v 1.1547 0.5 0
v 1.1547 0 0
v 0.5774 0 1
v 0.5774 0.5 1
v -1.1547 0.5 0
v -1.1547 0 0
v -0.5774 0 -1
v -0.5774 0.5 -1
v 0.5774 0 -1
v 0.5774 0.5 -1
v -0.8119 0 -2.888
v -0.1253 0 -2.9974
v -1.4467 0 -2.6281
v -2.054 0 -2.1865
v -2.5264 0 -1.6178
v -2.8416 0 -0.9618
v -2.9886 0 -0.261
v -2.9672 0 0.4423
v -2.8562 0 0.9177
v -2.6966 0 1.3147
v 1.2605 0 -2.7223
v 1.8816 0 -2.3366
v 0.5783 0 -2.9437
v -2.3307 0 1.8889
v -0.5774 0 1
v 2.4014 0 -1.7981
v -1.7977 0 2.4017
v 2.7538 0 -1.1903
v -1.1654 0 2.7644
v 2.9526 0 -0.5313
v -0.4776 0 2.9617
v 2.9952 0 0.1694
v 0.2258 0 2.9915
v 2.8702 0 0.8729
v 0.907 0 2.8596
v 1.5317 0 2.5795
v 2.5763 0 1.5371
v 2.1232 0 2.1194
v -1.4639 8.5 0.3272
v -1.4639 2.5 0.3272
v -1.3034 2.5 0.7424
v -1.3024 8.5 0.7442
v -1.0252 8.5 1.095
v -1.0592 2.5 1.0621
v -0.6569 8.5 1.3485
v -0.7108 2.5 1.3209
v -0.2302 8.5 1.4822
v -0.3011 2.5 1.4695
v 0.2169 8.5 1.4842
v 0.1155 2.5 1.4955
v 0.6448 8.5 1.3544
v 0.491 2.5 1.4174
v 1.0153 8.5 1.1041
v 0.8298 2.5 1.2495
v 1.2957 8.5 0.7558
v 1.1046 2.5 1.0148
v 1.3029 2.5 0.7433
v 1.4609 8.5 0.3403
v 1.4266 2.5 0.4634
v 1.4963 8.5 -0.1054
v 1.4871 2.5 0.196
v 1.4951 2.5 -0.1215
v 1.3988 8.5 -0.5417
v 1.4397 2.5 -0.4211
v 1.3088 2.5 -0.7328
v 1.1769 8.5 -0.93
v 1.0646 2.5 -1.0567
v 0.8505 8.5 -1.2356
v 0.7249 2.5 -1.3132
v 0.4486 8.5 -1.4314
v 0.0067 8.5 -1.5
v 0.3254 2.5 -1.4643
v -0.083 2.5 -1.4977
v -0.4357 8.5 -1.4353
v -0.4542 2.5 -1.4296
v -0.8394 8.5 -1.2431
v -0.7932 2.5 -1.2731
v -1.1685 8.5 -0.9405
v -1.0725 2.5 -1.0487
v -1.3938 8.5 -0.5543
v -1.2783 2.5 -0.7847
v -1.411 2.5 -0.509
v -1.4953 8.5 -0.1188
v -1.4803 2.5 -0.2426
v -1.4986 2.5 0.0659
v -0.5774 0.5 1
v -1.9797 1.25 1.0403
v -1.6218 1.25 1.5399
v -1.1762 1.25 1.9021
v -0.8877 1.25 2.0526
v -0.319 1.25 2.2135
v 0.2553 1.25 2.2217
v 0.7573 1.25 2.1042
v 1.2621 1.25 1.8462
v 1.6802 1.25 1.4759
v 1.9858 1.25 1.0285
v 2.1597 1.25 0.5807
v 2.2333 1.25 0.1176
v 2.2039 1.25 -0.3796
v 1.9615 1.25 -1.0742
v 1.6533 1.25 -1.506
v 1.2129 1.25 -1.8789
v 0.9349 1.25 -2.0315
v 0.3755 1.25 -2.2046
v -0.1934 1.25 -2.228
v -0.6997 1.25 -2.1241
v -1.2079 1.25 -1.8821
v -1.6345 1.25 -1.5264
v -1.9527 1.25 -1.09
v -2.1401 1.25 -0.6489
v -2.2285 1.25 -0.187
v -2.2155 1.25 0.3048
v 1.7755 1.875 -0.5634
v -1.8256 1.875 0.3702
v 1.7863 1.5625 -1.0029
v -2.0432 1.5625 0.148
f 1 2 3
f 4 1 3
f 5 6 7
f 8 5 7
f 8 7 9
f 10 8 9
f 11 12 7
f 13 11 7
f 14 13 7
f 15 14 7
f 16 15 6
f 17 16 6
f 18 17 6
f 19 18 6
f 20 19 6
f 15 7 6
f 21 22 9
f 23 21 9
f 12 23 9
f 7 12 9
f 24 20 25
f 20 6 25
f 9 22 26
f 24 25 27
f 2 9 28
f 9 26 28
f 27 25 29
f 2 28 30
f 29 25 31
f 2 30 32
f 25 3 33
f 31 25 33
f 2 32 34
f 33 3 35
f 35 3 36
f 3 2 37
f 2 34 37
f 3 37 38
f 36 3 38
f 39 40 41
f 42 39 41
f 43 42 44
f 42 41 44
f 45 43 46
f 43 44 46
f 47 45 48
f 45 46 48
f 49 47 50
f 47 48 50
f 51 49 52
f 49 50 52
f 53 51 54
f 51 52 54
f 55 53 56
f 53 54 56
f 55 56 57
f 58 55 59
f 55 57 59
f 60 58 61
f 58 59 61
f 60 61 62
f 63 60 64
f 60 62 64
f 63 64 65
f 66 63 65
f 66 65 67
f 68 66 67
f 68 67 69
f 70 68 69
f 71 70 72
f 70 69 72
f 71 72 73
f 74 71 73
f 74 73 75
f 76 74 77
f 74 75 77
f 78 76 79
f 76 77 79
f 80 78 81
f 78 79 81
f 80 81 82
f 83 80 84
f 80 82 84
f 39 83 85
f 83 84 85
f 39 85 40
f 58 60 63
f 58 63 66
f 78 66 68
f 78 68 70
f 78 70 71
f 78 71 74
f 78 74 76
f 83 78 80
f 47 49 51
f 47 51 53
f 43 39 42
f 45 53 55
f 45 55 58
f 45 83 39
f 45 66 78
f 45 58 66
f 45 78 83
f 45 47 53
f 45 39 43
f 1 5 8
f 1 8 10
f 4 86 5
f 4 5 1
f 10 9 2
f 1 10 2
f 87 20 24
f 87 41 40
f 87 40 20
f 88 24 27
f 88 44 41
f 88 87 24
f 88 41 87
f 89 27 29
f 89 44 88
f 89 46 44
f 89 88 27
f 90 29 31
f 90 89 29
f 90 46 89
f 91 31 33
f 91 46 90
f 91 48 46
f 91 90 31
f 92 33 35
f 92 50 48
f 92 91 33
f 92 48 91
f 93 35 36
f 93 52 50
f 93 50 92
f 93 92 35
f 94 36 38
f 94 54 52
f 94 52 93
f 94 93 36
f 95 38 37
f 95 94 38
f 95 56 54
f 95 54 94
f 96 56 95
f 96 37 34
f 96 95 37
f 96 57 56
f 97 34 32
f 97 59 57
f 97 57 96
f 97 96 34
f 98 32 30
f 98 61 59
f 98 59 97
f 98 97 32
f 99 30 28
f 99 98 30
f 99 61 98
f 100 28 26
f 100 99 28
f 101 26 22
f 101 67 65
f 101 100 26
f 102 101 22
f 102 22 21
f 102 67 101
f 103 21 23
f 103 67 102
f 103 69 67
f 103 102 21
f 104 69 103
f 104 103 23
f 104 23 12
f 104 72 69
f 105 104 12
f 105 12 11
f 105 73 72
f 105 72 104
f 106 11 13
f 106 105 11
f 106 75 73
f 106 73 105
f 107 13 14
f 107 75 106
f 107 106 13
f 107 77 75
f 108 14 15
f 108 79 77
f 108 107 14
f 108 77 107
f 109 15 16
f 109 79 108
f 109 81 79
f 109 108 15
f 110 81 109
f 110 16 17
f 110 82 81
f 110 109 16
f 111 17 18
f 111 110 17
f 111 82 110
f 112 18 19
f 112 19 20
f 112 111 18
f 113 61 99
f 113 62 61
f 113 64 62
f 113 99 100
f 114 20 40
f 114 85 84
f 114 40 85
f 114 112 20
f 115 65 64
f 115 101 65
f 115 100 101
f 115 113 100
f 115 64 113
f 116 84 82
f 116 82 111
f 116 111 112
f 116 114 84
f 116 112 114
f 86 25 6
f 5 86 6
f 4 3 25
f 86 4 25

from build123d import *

# Parameters (mm, degrees)
SKETCH_3_R          = 1.5
EXTRUDE_1_DEPTH     = 6
CUT_EXTRUDE_1_DEPTH = 0.5


with BuildPart() as part:
    # 放样1: read off the stored shape, not the designer's step
    # 放样1: loft between two sections, ruled curve by curve
    loft_1_from = [
        Edge.make_bspline([(-2.696565737, 0, 1.314736942), (-0.067091854, 0, 6.707868416), (5.32603962, 0, 4.078394533), (2.696565737, 0, -1.314736942), (0.067091854, 0, -6.707868416), (-5.32603962, 0, -4.078394533), (-2.696565737, 0, 1.314736942)], [0, 0, 0, 0, 0.5, 0.5, 0.5, 1, 1, 1, 1], 3, [1, 0.333333333, 0.333333333, 1, 0.333333333, 0.333333333, 1]),
    ]
    loft_1_to = [
        Edge.make_bspline([(-1.463875143, 2.5, 0.327214862), (-0.809445419, 2.5, 3.254965148), (2.118304867, 2.5, 2.600535424), (1.463875143, 2.5, -0.327214862), (0.809445419, 2.5, -3.254965148), (-2.118304867, 2.5, -2.600535424), (-1.463875143, 2.5, 0.327214862)], [0, 0, 0, 0, 0.5, 0.5, 0.5, 1, 1, 1, 1], 3, [1, 0.333333333, 0.333333333, 1, 0.333333333, 0.333333333, 1]),
    ]
    loft_1 = Solid(Shell([*[Face.make_surface_from_curves(loft_1_from[k], loft_1_to[k]) for k in range(1)], Face(Wire(loft_1_from)), Face(Wire(loft_1_to))]))
    add(loft_1)

    # 草图3 → 凸台-拉伸1 (add)
    with BuildSketch(Plane(origin=(0, 2.5, 0), x_dir=(1, 0, 0), z_dir=(0, 1, 0))):
        with Locations(Location((0, 0, 0), (0, 0, 192.6))):
            Circle(SKETCH_3_R)
    extrude(amount=EXTRUDE_1_DEPTH)

    # 草图4 → 切除-拉伸1 (cut)
    with BuildSketch(Plane.XZ):
        Polygon((0.577350269, 1), (-0.577350269, 1), (-1.154700538, 0), (-0.577350269, -1), (0.577350269, -1), (1.154700538, 0), align=None)
    extrude(amount=-CUT_EXTRUDE_1_DEPTH, mode=Mode.SUBTRACT)


solid = part.part
